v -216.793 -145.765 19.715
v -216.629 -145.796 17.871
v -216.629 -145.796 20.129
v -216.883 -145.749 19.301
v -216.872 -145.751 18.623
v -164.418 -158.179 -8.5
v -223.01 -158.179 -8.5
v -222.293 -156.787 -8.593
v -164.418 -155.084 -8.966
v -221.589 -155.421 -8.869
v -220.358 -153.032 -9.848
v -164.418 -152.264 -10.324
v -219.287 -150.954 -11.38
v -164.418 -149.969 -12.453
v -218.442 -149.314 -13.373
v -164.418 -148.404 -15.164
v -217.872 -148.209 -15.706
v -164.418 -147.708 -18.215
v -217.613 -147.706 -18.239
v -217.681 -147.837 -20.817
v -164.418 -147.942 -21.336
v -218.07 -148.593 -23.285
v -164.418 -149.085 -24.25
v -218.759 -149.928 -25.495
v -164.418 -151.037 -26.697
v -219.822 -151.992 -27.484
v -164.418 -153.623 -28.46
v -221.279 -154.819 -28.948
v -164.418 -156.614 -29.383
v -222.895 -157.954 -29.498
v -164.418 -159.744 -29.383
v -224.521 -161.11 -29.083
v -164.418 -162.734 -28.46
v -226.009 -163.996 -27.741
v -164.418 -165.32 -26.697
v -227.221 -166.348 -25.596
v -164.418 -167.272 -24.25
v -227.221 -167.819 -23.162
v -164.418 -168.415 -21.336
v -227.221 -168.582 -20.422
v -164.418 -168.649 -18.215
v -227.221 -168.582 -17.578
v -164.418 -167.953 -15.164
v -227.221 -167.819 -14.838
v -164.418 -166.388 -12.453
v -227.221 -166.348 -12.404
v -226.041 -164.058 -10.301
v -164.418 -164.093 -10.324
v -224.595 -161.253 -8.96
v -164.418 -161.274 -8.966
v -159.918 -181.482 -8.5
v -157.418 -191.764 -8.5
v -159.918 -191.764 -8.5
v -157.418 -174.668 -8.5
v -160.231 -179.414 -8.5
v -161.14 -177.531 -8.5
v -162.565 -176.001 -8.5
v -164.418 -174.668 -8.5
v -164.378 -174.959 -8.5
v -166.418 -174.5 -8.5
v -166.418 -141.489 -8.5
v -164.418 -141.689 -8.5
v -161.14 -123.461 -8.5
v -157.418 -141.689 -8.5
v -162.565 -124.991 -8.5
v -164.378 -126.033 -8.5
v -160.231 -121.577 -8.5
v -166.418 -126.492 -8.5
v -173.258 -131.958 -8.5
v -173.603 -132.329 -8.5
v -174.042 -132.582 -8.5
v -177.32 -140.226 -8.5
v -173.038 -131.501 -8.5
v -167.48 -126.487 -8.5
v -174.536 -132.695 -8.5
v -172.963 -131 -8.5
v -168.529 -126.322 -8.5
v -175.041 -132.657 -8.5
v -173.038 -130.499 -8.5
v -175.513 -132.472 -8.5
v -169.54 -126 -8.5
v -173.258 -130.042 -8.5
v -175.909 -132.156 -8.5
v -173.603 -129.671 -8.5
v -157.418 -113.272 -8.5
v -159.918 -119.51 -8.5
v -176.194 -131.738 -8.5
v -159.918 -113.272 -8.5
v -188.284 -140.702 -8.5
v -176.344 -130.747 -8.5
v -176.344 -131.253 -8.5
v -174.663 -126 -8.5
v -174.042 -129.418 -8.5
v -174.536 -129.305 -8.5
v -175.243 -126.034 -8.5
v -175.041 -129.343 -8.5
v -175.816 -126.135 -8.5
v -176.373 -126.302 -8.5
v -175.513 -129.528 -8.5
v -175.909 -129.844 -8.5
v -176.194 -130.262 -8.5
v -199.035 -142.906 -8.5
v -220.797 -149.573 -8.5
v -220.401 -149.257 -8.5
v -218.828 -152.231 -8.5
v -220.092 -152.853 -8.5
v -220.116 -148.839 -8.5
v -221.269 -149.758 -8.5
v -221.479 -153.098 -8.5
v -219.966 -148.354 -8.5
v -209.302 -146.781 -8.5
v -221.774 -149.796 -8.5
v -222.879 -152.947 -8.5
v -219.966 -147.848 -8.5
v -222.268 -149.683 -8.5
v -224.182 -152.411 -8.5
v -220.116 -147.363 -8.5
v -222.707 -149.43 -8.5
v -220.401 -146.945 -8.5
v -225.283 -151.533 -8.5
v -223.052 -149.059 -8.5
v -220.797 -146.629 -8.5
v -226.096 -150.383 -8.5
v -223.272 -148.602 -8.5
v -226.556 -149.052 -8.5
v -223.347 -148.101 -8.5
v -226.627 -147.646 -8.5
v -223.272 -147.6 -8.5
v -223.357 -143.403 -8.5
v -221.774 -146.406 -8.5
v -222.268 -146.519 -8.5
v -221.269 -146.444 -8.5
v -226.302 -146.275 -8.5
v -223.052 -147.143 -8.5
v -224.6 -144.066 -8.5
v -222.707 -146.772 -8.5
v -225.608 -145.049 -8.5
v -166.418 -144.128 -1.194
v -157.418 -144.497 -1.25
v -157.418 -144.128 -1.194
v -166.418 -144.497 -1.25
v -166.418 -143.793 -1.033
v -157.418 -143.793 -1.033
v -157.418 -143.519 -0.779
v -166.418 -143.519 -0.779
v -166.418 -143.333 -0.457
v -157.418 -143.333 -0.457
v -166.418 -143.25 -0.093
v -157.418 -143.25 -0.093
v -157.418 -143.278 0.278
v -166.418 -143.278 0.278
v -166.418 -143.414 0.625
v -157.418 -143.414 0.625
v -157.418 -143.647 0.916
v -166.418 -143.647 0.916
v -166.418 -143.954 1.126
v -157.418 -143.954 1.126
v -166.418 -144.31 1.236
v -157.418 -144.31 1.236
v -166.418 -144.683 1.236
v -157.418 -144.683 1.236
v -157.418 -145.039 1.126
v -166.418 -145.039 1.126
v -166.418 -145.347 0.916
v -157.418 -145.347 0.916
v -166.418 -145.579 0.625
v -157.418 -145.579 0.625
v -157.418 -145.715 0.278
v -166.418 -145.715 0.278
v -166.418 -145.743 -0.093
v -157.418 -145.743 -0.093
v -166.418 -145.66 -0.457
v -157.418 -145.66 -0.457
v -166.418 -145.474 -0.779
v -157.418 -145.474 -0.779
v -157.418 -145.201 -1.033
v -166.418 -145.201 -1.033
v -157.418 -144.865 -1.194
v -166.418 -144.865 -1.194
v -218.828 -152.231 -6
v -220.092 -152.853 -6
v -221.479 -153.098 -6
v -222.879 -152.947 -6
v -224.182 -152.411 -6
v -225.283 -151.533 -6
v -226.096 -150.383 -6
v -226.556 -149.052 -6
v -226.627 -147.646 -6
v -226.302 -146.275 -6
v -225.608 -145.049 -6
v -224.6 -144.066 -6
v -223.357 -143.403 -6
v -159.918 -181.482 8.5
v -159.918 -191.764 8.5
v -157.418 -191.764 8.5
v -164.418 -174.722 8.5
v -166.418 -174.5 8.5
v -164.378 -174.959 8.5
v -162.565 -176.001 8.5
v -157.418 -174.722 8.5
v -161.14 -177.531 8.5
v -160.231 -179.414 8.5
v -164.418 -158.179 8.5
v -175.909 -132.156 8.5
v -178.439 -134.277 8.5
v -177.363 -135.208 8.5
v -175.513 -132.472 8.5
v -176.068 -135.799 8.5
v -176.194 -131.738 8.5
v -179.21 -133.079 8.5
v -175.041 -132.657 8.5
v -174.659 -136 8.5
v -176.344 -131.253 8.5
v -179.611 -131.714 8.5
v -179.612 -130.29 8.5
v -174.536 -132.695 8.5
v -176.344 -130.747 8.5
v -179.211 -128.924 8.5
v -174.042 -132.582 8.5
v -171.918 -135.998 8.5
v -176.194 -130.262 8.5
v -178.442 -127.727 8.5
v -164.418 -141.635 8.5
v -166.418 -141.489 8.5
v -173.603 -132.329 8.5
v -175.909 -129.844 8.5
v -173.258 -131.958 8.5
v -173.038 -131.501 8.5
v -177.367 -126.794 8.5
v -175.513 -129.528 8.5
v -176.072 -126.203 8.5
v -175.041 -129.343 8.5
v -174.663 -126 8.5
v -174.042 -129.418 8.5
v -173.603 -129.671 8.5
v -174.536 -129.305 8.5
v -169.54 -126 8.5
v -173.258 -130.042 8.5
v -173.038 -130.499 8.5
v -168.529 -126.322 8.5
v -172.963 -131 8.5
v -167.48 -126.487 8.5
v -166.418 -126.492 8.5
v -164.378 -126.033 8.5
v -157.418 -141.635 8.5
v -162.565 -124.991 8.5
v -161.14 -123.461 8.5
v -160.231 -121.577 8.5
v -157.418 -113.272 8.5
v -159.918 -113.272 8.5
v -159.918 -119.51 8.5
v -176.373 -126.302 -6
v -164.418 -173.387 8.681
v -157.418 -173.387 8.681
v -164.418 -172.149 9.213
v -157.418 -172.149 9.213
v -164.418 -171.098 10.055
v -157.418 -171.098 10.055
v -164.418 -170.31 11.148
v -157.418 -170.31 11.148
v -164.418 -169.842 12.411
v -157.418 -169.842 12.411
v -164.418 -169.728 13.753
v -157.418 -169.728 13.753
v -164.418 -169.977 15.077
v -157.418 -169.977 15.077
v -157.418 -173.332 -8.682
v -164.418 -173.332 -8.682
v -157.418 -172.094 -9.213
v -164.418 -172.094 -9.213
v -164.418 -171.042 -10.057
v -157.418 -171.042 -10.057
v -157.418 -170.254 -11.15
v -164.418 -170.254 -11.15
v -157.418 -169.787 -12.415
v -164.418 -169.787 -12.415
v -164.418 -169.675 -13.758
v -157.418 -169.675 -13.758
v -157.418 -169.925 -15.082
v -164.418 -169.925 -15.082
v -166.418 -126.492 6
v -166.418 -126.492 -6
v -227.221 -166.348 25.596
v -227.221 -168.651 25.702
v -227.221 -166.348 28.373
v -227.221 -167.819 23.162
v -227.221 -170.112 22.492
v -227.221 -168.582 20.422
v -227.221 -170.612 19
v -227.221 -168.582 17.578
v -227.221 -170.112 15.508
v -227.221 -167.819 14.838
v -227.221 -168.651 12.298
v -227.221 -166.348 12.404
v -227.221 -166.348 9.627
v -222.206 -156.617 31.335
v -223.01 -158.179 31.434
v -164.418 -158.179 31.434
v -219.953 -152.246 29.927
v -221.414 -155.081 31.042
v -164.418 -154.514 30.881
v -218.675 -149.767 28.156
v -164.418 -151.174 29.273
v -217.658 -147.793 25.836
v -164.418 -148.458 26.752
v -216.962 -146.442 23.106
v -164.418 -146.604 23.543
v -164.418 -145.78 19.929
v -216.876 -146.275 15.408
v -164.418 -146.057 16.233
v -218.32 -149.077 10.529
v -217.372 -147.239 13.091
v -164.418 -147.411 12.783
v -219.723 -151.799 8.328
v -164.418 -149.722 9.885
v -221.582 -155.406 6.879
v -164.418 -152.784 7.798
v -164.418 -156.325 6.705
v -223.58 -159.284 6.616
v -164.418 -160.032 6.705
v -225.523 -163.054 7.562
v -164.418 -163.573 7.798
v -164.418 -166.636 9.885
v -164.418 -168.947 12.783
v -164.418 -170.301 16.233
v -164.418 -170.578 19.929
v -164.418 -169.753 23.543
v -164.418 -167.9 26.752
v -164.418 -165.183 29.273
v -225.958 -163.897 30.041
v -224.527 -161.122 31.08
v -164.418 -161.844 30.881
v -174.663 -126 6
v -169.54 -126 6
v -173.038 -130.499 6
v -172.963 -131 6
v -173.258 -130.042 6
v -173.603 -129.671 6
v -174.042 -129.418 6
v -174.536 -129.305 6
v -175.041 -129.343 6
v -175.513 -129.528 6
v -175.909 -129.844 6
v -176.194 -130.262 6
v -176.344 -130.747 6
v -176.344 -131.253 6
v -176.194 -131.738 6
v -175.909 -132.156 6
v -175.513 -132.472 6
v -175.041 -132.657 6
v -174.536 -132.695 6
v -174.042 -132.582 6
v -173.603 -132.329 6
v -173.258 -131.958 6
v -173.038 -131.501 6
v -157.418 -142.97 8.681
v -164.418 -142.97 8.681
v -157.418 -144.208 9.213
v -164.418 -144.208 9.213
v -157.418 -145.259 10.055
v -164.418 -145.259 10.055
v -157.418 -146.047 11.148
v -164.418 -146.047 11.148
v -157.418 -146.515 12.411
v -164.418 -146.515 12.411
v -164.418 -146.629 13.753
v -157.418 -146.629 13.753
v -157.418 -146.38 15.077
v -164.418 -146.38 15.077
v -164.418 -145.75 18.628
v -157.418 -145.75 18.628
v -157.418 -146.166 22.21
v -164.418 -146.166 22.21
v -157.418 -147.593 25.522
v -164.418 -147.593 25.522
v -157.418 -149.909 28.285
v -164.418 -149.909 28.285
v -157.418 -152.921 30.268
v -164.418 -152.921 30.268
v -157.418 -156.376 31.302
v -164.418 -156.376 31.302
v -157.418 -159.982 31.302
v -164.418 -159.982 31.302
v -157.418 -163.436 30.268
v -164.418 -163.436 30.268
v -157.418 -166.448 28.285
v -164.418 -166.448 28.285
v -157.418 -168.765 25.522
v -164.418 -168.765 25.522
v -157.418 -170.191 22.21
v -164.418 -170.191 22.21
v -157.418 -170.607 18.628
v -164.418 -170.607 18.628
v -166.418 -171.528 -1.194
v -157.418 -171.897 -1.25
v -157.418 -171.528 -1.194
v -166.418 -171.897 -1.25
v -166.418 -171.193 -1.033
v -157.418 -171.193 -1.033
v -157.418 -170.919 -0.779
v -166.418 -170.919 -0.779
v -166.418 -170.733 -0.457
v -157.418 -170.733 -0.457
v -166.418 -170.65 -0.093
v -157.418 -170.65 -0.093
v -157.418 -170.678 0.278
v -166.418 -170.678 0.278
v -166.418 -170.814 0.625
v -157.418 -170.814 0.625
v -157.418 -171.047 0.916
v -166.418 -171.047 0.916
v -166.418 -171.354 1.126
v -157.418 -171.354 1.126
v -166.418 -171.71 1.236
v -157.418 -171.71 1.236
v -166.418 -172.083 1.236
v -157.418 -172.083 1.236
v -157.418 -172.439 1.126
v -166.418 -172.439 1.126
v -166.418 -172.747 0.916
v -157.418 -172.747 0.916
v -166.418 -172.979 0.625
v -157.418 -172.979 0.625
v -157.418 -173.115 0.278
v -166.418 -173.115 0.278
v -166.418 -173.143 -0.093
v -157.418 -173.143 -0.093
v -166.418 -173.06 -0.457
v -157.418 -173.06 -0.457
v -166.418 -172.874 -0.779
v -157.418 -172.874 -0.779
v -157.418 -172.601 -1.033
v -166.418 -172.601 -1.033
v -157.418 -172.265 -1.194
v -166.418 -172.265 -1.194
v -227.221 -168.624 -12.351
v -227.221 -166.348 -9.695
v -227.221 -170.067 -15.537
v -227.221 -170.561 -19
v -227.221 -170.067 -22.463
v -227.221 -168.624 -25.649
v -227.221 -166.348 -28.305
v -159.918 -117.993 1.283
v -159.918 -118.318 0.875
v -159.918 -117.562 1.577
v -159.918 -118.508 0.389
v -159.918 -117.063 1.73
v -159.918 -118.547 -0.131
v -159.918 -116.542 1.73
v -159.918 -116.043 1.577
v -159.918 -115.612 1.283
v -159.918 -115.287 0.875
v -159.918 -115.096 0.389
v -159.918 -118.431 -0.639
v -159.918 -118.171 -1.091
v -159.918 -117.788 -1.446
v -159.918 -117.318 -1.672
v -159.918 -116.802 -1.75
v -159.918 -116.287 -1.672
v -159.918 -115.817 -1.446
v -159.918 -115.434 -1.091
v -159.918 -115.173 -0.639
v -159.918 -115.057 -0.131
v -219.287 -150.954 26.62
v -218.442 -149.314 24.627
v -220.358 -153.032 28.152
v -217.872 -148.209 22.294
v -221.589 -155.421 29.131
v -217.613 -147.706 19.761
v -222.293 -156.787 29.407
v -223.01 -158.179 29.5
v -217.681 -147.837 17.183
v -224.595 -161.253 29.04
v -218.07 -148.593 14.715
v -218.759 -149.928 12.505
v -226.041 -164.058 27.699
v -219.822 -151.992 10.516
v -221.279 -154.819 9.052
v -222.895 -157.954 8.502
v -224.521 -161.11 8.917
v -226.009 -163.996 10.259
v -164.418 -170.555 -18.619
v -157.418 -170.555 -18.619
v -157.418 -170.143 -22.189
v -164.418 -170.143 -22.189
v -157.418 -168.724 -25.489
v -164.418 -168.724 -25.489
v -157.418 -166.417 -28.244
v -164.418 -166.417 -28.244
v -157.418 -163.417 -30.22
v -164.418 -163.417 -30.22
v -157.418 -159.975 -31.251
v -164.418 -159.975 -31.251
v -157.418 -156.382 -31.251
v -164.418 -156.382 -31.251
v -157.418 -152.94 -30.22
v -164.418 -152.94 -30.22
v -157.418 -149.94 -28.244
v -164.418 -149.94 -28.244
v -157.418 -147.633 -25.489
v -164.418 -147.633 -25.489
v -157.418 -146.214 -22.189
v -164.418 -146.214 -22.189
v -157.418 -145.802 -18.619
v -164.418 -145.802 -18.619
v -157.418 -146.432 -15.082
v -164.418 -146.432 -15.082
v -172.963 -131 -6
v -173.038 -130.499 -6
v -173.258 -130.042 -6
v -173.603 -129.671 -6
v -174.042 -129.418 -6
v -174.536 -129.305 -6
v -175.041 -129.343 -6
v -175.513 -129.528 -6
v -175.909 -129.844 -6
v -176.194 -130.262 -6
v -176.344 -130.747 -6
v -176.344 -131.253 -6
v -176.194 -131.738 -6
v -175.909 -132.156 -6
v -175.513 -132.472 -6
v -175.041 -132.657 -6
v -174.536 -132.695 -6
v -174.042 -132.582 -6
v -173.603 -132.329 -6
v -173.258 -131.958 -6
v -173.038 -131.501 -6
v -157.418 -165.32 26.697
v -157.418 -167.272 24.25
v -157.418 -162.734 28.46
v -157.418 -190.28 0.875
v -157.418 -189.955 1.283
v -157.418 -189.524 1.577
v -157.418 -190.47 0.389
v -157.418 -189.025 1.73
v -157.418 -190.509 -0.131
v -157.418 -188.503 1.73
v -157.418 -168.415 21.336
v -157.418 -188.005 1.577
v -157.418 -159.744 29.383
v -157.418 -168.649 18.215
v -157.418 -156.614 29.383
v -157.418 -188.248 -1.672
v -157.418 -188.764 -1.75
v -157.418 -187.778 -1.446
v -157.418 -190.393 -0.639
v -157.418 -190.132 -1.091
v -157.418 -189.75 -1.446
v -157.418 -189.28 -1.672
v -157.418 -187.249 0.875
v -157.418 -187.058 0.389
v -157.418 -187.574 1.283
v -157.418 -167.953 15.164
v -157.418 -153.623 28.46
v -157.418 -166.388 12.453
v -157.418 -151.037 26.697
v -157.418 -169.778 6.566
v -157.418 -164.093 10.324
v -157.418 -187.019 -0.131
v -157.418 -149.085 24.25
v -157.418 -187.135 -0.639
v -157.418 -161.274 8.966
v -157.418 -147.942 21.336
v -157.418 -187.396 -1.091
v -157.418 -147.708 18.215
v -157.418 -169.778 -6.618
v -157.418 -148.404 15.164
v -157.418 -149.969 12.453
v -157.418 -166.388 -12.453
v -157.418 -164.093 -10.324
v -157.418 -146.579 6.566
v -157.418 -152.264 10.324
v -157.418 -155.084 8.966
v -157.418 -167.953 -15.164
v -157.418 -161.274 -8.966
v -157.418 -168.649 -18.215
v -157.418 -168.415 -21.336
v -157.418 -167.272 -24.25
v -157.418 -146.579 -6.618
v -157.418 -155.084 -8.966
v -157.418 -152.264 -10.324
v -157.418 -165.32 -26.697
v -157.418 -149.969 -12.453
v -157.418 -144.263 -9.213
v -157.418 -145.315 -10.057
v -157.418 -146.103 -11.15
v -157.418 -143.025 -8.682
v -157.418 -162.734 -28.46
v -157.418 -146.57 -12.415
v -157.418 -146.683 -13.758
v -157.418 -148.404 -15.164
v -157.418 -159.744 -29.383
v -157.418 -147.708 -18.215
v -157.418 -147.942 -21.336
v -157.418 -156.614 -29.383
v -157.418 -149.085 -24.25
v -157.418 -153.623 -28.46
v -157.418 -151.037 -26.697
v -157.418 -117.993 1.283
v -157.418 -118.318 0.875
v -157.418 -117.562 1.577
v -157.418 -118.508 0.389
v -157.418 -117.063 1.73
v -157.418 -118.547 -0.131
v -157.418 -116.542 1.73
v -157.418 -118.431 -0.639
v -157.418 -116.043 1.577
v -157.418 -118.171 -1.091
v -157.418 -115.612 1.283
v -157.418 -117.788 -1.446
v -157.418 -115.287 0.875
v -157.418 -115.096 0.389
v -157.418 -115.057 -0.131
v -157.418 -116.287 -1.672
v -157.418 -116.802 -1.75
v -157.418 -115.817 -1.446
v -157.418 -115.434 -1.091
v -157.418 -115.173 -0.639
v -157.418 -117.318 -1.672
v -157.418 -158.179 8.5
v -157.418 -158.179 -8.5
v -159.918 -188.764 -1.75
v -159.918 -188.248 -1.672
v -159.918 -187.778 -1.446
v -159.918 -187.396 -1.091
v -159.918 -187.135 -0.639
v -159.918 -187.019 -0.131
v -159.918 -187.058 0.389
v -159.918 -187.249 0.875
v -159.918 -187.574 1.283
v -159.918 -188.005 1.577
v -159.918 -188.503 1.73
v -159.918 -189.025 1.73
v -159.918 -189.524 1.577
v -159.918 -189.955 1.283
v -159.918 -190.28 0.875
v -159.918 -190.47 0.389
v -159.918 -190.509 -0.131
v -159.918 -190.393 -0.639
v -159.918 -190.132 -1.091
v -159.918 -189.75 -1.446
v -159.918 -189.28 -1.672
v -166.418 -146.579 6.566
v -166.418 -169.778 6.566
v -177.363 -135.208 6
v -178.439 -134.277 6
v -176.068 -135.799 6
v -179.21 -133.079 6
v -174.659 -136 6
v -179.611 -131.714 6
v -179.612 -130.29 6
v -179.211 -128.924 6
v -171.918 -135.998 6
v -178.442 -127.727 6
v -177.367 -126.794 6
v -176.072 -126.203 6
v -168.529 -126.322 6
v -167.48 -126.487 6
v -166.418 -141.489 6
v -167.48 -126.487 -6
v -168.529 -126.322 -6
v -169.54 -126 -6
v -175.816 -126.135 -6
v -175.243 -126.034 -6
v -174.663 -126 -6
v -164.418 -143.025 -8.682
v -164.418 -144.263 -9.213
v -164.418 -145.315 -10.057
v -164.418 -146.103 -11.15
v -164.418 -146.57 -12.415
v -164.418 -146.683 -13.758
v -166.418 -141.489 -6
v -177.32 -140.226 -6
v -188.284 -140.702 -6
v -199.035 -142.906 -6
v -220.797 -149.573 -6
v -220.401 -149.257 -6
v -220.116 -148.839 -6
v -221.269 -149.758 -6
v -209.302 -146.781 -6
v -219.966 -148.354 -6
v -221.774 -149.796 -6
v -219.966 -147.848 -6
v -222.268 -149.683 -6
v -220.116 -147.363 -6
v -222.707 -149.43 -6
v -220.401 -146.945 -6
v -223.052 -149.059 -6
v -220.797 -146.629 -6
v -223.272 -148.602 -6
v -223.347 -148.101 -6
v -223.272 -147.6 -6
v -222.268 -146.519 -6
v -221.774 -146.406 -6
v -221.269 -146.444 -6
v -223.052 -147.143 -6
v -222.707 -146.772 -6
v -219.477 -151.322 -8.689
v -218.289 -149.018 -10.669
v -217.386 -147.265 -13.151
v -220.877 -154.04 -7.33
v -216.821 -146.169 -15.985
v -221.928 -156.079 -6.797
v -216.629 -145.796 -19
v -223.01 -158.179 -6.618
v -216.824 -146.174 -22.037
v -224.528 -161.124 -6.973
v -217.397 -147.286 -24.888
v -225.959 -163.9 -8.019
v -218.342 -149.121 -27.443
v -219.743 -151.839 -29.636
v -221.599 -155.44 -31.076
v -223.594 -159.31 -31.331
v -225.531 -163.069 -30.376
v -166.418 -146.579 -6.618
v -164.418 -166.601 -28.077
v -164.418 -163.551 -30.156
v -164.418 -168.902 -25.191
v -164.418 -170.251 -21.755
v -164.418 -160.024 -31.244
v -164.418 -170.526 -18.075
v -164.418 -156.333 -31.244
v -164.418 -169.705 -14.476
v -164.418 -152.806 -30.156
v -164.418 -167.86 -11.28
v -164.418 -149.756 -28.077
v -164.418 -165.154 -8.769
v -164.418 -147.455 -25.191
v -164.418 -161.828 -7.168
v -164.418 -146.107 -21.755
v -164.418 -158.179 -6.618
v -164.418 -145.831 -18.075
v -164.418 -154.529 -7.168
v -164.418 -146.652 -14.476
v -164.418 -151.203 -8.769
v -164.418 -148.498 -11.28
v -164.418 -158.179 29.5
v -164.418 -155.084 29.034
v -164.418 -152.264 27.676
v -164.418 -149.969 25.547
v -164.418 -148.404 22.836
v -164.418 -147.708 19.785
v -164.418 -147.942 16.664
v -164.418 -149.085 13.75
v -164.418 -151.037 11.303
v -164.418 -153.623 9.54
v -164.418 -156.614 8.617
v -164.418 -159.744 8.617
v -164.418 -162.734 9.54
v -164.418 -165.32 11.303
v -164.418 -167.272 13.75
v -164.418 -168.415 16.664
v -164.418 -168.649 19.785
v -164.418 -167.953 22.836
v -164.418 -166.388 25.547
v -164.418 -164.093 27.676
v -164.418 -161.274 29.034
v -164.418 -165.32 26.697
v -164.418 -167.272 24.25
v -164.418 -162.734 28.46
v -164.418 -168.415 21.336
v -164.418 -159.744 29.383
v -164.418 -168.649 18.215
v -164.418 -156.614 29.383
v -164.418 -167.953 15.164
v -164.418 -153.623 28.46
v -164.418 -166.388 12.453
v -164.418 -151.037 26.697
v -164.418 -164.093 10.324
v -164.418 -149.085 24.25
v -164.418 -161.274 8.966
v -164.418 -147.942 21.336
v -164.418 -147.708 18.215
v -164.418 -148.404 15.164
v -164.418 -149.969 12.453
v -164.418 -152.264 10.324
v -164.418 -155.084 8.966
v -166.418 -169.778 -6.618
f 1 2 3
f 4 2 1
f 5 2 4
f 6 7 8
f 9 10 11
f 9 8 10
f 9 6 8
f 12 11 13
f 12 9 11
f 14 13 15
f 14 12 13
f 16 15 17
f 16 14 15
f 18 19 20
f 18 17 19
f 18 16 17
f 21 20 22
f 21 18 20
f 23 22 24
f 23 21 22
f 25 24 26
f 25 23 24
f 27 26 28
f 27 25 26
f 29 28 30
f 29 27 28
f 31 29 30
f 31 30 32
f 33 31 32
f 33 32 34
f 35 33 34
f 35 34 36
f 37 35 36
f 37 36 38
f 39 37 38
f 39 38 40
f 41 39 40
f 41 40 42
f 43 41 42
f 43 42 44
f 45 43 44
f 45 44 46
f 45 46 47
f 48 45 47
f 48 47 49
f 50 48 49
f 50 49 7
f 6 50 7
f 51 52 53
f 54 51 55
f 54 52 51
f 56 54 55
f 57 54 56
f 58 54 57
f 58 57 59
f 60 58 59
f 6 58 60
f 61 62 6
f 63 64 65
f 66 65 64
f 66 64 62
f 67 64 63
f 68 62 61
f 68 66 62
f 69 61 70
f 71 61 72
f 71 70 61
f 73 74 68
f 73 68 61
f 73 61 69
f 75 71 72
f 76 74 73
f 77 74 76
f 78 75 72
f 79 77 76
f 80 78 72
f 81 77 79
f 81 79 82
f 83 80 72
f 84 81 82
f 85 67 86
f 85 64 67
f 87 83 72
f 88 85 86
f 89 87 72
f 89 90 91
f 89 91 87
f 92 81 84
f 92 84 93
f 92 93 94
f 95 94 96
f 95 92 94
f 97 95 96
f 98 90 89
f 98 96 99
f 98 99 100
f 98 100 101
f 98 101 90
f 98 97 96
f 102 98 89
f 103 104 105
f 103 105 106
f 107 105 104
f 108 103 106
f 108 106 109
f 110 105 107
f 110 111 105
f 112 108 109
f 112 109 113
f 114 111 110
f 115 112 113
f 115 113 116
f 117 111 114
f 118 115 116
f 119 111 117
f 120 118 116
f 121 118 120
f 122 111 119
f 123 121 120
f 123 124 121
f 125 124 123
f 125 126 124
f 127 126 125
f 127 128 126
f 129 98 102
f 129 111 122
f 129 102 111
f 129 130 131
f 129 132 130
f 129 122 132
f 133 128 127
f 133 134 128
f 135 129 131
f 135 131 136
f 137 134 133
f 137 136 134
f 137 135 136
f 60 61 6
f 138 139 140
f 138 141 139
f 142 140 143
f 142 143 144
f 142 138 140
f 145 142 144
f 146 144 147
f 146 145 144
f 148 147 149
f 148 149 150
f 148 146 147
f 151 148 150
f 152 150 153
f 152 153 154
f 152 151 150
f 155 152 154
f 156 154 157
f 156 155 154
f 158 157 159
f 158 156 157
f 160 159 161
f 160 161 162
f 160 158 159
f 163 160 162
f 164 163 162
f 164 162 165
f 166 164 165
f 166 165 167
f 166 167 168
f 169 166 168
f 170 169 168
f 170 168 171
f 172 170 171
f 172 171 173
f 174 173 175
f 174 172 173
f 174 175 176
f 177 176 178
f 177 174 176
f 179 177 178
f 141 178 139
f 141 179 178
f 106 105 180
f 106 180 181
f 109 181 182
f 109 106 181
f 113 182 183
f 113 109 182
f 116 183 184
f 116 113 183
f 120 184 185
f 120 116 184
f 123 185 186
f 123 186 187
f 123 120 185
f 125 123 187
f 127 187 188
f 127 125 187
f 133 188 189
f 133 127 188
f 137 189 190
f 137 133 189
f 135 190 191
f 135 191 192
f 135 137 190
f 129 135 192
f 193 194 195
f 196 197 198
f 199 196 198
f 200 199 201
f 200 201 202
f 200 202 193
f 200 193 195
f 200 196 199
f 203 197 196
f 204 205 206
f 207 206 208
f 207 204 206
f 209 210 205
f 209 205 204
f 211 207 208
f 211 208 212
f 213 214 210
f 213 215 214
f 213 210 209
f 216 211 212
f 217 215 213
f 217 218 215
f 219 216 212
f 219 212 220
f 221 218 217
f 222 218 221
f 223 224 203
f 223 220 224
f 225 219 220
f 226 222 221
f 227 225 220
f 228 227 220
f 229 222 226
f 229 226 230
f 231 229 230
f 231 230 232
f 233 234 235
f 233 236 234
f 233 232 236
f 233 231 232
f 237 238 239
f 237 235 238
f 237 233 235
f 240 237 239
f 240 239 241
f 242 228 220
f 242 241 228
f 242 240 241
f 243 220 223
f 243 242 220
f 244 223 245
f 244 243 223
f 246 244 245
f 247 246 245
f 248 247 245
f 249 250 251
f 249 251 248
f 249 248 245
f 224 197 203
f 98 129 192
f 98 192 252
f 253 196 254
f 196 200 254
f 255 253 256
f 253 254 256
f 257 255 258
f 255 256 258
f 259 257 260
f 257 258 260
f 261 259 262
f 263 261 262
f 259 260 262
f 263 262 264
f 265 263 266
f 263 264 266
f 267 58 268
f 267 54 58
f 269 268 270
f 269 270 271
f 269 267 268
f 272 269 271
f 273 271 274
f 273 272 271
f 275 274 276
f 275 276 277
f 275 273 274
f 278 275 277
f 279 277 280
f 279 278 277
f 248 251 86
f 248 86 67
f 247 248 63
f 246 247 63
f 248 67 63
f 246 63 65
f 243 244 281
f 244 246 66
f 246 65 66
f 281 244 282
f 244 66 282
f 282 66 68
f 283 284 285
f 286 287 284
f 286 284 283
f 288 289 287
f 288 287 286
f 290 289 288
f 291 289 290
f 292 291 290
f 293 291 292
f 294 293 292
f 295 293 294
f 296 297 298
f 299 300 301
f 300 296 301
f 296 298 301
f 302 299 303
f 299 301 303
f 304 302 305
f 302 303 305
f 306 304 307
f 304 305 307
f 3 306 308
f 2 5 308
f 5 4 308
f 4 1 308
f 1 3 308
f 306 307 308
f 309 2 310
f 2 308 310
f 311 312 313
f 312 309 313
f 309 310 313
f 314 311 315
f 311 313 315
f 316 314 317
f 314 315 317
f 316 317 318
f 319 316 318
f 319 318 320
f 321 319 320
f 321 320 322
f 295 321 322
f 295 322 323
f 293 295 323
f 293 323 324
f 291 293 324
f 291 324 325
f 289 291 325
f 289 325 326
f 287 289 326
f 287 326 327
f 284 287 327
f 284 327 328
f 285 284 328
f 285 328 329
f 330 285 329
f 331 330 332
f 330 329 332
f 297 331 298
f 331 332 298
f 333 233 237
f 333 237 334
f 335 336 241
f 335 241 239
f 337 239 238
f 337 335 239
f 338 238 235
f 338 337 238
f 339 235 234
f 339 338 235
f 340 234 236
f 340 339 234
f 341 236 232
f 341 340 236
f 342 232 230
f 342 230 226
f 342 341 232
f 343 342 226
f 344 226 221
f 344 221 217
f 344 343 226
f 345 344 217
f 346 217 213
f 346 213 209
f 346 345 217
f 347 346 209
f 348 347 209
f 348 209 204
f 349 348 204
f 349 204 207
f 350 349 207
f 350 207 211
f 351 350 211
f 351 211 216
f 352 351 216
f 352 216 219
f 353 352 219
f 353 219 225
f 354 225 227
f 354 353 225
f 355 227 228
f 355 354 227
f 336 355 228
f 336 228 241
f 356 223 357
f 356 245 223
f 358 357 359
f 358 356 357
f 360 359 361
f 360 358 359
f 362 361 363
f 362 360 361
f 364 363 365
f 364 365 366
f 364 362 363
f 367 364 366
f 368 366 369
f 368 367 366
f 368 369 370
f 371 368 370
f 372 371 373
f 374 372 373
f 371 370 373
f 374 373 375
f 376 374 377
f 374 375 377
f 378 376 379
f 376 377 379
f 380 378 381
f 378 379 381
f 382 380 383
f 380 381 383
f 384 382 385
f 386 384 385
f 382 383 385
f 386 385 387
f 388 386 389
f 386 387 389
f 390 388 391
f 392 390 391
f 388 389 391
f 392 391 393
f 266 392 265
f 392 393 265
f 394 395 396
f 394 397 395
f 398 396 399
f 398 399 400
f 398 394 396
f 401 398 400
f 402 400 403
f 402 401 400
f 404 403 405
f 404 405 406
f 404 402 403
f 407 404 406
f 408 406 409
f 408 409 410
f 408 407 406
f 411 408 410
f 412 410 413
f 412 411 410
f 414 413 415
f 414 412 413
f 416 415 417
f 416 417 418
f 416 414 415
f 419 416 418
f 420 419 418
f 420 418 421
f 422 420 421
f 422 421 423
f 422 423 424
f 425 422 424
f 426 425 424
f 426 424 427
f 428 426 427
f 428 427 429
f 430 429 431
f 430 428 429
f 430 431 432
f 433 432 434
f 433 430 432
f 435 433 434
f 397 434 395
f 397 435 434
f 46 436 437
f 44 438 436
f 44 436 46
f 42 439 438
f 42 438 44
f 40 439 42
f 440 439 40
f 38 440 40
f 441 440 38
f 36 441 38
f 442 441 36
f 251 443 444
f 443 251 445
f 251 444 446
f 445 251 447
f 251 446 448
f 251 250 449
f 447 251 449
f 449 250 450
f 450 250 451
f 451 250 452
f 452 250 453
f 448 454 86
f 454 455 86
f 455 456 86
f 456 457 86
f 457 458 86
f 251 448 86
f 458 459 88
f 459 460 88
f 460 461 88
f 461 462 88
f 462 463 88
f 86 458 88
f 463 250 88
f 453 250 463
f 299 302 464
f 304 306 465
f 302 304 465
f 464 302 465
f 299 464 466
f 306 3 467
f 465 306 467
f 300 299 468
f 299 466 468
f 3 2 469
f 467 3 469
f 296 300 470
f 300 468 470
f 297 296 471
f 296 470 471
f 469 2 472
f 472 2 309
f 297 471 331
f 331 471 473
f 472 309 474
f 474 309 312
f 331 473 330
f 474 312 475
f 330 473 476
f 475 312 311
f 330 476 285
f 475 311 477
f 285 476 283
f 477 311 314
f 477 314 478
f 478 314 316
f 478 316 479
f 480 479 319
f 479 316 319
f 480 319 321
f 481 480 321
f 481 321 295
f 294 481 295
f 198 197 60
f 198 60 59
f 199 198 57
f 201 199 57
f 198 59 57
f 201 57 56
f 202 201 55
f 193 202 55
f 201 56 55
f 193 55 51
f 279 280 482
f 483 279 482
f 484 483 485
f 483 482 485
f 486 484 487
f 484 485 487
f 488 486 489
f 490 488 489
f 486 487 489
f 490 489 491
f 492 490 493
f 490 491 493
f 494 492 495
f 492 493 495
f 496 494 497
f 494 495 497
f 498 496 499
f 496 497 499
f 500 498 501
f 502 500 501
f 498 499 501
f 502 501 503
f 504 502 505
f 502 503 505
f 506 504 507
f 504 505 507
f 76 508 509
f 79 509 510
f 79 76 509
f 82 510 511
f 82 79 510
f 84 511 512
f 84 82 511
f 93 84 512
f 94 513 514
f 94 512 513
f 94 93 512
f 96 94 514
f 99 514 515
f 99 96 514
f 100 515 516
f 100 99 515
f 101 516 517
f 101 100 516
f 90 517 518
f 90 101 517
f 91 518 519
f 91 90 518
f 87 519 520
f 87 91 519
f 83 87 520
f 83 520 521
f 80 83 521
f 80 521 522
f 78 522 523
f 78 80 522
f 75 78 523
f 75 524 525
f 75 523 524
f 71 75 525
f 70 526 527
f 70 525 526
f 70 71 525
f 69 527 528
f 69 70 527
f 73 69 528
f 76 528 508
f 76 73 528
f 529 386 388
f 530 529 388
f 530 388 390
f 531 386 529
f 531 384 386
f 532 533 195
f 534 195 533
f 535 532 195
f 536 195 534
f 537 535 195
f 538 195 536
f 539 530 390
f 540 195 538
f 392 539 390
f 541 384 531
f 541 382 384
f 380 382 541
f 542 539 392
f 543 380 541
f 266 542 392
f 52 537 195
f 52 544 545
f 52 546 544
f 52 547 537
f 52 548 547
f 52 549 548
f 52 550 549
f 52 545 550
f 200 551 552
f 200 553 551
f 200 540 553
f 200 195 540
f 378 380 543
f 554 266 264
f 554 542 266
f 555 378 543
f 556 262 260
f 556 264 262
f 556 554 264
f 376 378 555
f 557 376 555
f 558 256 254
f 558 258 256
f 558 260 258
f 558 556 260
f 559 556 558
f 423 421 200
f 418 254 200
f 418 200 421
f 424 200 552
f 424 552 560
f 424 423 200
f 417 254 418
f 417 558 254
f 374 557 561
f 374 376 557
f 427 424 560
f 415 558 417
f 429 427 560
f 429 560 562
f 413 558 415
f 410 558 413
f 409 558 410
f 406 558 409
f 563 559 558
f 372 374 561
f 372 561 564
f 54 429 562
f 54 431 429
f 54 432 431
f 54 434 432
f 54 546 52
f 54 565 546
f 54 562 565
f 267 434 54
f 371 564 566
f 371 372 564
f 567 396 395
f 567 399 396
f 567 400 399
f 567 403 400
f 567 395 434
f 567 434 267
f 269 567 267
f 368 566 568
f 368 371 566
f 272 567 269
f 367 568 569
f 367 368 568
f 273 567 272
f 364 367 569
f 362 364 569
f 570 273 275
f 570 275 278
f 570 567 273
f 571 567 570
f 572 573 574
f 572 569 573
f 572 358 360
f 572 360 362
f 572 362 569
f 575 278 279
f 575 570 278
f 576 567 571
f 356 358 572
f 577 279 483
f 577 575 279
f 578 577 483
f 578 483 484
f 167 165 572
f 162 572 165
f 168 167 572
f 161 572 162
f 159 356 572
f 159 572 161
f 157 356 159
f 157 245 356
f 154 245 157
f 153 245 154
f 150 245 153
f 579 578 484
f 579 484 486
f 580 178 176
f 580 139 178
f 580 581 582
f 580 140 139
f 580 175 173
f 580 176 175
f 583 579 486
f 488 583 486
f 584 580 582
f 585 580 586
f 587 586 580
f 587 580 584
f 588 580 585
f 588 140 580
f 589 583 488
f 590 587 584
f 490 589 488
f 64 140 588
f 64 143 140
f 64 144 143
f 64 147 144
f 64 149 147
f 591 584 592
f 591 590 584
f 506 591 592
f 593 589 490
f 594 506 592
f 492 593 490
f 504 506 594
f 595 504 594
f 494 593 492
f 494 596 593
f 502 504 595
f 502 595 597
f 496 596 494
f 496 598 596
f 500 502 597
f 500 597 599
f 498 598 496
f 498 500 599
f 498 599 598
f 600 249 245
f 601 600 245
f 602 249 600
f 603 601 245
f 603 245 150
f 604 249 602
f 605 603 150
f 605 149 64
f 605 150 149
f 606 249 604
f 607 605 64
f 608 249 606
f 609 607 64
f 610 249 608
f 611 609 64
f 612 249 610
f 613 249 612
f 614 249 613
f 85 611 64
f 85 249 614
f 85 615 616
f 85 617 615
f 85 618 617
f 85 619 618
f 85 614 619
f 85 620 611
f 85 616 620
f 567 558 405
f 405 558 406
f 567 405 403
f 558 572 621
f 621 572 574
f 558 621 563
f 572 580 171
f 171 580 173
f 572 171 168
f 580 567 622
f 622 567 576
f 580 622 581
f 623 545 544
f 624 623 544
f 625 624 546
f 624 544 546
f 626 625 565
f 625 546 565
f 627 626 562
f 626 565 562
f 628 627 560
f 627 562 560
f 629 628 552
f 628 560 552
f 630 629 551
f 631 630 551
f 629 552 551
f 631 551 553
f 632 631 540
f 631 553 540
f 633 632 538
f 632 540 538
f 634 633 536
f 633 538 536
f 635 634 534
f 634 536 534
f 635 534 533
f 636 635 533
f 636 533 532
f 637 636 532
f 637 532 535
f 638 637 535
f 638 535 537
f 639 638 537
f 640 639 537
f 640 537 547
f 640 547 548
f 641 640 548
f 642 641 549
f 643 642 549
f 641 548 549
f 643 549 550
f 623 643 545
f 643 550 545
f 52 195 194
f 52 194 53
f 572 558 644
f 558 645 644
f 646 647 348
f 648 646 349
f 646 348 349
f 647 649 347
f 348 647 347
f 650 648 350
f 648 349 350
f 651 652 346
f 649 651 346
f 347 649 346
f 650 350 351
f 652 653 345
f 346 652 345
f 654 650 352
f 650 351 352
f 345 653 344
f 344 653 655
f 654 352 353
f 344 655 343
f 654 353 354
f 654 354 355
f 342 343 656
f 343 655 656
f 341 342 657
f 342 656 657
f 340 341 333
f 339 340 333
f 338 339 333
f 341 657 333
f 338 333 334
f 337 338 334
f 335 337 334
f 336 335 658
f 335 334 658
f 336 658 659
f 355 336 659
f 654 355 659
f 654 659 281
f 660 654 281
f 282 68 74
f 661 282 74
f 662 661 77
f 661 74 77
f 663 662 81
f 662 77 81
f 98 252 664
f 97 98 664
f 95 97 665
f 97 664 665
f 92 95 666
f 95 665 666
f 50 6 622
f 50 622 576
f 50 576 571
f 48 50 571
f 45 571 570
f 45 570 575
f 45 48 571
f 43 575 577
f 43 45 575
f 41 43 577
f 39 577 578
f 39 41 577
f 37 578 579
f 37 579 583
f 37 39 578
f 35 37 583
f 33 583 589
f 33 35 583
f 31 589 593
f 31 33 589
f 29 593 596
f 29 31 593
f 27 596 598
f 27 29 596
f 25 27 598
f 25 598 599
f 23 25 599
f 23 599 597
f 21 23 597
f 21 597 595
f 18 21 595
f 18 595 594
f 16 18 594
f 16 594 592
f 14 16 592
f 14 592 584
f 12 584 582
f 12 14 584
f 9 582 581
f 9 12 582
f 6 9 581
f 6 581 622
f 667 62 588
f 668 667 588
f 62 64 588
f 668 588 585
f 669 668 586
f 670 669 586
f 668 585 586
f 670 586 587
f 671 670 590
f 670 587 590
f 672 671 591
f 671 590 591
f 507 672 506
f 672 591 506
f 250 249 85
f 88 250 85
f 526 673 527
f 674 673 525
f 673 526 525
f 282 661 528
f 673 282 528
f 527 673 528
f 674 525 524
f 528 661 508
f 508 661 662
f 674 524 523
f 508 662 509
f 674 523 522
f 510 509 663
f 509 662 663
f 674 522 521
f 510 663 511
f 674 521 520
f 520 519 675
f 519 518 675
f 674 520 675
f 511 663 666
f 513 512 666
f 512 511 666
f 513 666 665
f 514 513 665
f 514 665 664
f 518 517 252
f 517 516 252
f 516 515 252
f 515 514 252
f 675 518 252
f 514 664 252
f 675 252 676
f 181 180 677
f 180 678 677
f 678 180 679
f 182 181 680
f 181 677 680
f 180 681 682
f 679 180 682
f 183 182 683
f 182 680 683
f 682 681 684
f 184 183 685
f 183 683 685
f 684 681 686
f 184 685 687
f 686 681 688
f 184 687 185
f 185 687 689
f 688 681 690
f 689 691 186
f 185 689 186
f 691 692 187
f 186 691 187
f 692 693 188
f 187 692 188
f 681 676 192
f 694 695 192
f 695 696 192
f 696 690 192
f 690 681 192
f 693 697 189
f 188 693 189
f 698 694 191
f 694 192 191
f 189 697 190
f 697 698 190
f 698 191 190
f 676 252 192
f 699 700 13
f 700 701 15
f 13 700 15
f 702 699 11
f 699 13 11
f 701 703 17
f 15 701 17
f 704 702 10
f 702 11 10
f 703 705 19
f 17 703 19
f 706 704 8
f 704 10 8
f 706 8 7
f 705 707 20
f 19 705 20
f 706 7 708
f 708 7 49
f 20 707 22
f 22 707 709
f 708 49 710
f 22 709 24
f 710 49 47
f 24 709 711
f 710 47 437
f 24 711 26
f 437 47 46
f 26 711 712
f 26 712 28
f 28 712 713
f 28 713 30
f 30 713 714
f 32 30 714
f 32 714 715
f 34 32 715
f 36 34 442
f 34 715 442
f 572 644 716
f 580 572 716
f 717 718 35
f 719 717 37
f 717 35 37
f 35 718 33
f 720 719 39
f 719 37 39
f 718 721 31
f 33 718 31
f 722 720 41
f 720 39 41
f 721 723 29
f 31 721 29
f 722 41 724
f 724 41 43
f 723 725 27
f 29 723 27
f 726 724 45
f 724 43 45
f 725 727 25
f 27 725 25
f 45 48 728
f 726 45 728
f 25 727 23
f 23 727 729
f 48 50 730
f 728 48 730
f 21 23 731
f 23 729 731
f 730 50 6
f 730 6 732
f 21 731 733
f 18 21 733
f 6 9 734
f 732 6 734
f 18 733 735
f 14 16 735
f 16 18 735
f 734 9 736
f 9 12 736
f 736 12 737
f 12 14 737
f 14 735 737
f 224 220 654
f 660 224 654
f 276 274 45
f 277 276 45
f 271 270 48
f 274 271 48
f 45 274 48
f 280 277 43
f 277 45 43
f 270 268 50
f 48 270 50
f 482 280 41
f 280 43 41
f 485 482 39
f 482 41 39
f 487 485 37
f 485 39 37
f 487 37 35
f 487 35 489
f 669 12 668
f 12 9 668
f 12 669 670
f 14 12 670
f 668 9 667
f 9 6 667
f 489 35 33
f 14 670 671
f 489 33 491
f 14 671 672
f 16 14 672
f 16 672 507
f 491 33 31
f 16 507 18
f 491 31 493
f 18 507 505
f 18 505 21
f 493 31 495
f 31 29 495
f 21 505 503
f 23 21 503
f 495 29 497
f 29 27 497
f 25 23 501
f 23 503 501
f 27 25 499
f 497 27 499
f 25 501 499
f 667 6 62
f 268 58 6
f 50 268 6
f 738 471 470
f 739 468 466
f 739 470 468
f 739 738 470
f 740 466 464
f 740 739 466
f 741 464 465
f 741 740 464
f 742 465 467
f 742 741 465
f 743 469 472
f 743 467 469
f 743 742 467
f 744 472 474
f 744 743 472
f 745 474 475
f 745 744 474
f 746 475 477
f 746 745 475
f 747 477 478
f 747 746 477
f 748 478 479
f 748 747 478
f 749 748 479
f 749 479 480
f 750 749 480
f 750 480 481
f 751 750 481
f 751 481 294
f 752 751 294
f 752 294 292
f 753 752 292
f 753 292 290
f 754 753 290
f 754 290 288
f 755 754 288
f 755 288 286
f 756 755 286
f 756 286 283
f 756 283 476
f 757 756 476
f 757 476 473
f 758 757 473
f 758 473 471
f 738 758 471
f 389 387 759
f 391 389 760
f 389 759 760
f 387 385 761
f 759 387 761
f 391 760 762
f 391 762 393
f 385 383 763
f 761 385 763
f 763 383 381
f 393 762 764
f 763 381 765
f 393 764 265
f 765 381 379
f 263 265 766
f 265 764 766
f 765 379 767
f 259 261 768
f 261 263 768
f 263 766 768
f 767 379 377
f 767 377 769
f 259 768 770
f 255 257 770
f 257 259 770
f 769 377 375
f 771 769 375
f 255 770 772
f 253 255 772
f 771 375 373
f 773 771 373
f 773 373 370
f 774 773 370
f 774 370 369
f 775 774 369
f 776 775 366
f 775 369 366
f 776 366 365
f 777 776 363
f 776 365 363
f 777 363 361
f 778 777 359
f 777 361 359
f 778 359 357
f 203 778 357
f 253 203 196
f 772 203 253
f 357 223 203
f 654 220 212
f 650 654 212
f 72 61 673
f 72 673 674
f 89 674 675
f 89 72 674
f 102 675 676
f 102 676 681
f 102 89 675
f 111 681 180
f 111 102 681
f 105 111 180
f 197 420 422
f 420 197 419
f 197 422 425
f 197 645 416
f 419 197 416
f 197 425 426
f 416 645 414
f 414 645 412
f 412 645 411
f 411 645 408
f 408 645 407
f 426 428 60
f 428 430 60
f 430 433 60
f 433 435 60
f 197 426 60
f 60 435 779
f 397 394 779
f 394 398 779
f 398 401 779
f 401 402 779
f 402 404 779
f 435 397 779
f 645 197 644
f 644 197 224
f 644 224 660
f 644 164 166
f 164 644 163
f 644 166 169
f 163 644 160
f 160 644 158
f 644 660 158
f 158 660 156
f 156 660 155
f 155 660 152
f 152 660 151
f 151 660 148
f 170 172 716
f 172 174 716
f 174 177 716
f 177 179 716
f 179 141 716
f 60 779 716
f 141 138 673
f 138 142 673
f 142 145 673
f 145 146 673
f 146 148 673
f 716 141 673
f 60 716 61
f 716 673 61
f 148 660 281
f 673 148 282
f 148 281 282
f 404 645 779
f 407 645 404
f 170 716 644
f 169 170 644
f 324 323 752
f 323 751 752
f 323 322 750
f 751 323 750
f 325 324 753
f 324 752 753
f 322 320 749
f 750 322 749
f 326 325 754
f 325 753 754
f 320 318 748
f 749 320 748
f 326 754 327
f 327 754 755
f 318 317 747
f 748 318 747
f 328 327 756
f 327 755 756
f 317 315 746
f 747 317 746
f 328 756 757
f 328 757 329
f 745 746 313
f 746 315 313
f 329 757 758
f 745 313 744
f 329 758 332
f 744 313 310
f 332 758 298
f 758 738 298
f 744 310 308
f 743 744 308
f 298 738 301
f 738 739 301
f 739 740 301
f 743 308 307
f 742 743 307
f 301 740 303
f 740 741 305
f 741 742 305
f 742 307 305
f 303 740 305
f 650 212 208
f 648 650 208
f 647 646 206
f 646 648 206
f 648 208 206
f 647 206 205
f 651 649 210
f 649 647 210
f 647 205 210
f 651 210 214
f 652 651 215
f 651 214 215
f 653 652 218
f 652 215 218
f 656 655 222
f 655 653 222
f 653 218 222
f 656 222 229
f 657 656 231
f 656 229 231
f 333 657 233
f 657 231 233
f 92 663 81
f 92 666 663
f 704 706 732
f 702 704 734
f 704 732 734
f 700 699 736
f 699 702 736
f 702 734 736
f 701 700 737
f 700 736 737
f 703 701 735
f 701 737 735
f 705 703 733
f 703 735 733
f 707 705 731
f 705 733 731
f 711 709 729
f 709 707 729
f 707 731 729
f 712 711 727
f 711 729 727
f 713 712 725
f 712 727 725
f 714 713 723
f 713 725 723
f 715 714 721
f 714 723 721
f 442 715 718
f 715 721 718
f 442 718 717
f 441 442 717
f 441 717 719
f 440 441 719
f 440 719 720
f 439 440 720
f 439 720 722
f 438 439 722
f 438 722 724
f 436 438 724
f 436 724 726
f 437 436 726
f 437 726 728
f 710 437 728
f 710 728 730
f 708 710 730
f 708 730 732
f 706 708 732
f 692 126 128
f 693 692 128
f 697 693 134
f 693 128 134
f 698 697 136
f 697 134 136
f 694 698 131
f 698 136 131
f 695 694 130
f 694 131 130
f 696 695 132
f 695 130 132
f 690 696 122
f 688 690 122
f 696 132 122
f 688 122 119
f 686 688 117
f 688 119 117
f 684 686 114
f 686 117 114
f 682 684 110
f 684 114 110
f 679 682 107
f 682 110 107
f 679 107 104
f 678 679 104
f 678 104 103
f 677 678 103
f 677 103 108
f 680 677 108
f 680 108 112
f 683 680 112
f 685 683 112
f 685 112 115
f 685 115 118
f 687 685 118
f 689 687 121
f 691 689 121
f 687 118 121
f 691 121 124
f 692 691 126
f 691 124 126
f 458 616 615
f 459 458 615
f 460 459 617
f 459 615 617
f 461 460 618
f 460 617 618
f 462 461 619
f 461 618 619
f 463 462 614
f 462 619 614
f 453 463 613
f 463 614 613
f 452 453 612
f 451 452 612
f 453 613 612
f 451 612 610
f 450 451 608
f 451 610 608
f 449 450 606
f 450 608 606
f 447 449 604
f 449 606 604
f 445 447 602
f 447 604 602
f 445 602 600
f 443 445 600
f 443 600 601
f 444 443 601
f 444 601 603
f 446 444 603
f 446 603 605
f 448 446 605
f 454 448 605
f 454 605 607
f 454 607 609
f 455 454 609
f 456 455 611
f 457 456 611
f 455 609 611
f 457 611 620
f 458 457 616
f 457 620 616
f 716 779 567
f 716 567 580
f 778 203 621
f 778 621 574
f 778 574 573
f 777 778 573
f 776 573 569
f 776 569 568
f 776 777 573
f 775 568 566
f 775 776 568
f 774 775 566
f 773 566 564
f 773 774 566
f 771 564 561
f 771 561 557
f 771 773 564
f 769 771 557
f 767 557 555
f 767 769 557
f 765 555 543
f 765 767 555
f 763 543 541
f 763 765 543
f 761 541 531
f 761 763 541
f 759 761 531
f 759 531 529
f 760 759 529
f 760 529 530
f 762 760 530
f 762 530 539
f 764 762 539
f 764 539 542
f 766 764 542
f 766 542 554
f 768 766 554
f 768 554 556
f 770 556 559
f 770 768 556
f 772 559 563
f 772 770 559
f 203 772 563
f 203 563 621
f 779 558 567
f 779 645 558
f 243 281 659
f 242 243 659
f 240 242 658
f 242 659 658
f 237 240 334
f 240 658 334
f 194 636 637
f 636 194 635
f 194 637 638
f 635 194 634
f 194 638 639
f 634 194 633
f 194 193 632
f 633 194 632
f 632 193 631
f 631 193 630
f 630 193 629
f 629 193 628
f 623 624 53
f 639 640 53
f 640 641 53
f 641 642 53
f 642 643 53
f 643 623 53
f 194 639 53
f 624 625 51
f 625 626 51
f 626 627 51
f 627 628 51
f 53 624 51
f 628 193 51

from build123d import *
from OCP.BRepFilletAPI import BRepFilletAPI_MakeChamfer

# Parameters (mm, degrees)
SKETCH_1_R          = 1.7
EXTRUDE_1_DEPTH     = 8.5
SKETCH_2_W          = 12
SKETCH_2_H          = 22.490317402
CUT_EXTRUDE_1_DEPTH = 17
SKETCH_3_W          = 17
SKETCH_3_H          = 48.5
SKETCH_3_R          = 1.25
SKETCH_3_W_2        = 13.183847054
SKETCH_3_H_2        = 23.198500104
EXTRUDE_2_DEPTH     = 2
CUT_EXTRUDE_2_DEPTH = 27
CHAMFER_1_SIZE      = 5.5
CHAMFER_1_SIZE2     = 5.4954286
SKETCH_5_R          = 10.5
SKETCH_5_R_2        = 1.25
SKETCH_5_W          = 13.183847054
SKETCH_5_H          = 23.198500104
EXTRUDE_3_DEPTH     = 7
SKETCH_6_R          = 12.433743537
SKETCH_6_R_2        = 10.5
EXTRUDE_4_DEPTH     = 65
SKETCH_6_R_3        = 12.382409409
EXTRUDE_4_2_DEPTH   = 65
CUT_EXTRUDE_3_DEPTH = 50
SKETCH_8_W          = 17
SKETCH_8_H          = 17.264216674
SKETCH_8_R          = 1.75
SKETCH_8_H_2        = 24.850413137
EXTRUDE_5_DEPTH     = 2.5
FILLET_START        = -8.5
FILLET_1_DEPTH      = 17
FILLET_1_2_DEPTH    = 2.5
FILLET_START_2      = 6
FILLET_1_3_DEPTH    = 2.5
FILLET_2_R          = 5
SKETCH_9_R          = 1.7
EXTRUDE_6_DEPTH     = 2.5
CUT_EXTRUDE_6_DEPTH = 49
SKETCH_13_W         = 3.687301031
SKETCH_13_H         = 25.158467393
CUT_EXTRUDE_7_DEPTH = 49


with BuildPart() as part:
    # 草图1 → 凸台-拉伸1 (new, symmetric)
    with BuildSketch(Plane.XY):
        with BuildLine():
            Line((-174.662698808, -126), (-166.418250776, -126))
            Line((-166.418250776, -126), (-166.418250776, -135.993140688))
            Line((-166.418250776, -135.993140688), (-174.658537801, -135.999998269))
            ThreePointArc((-174.658537801, -135.999998269), (-179.662698375, -131.002080504), (-174.662698808, -126))
        make_face()
        with Locations((-174.662698808, -131)):
            Circle(SKETCH_1_R, mode=Mode.SUBTRACT)
    extrude(amount=EXTRUDE_1_DEPTH, both=True)

    # 草图2 → 切除-拉伸1 (cut)
    with BuildSketch(Plane(origin=(-166.418250776, 0, 0), x_dir=(0, 0, -1), z_dir=(1, 0, 0))):
        with Locations((0, -126)):
            Rectangle(SKETCH_2_W, SKETCH_2_H)
    extrude(amount=-CUT_EXTRUDE_1_DEPTH, mode=Mode.SUBTRACT)


with BuildPart() as cut_extrude_1_piece_1:
    # of the separate pieces the step leaves, piece 1, a body of its own (cut_extrude_1_pieces)
    add(part.part.solids().sort_by_distance((-174.662698808, -126, 6))[0])



with BuildPart() as cut_extrude_1_piece_2:
    # of the separate pieces the step leaves, piece 2, a body of its own (cut_extrude_1_pieces)
    add(part.part.solids().sort_by_distance((-174.662698808, -126, -8.5))[0])


with BuildPart() as cut_extrude_1_piece_1_1:
    add(cut_extrude_1_piece_1.part)

    add(cut_extrude_1_piece_2.part)  # 凸台-拉伸2 merges 切除-拉伸1 piece 2
    # 草图3 → 凸台-拉伸2 (add)
    with BuildSketch(Plane(origin=(-166.418250776, 0, 0), x_dir=(0, 0, -1), z_dir=(1, 0, 0))):
        with Locations((0, -150.25)):
            Rectangle(SKETCH_3_W, SKETCH_3_H)
        with Locations((0, -144.496752449)):
            Circle(SKETCH_3_R, mode=Mode.SUBTRACT)
        with Locations((0, -171.896752449)):
            Circle(SKETCH_3_R, mode=Mode.SUBTRACT)
        with Locations((0.025667064, -158.178609239)):
            Rectangle(SKETCH_3_W_2, SKETCH_3_H_2, mode=Mode.SUBTRACT)
    extrude(amount=EXTRUDE_2_DEPTH)

    # 草图4 → 切除-拉伸2 (cut)
    with BuildSketch(Plane(origin=(0, 0, -8.5), x_dir=(-1, 0, 0), z_dir=(0, 0, -1))):
        Polygon((169.540474792, -126), (164.418250776, -131.122224016), (164.418250776, -126), align=None)
    extrude(amount=-CUT_EXTRUDE_2_DEPTH, mode=Mode.SUBTRACT)

    # 倒角1: one chamfer whose edges measure the first distance from different faces: ONE call of the kernel's chamfer builder (chamfer() names one face for all edges)
    chamfer_1_edges_1 = [cut_extrude_1_piece_1_1.edges().sort_by_distance(p)[0] for p in [
        (-166.418250776, -135.993140688, -7.25),
    ]]
    chamfer_1_side_1 = [cut_extrude_1_piece_1_1.faces().sort_by_distance(p)[0] for p in [
        (-170.538394288, -135.996569478, -7.25),
    ]]
    chamfer_1_edges_2 = [cut_extrude_1_piece_1_1.edges().sort_by_distance(p)[0] for p in [
        (-166.418250776, -135.993140688, 7.25),
    ]]
    chamfer_1_side_2 = [cut_extrude_1_piece_1_1.faces().sort_by_distance(p)[0] for p in [
        (-170.538394288, -135.996569478, 7.25),
    ]]
    chamfer_1 = BRepFilletAPI_MakeChamfer(cut_extrude_1_piece_1_1.part.solid().wrapped)
    for e in chamfer_1_edges_1:
        chamfer_1.Add(CHAMFER_1_SIZE, CHAMFER_1_SIZE2, e.wrapped, chamfer_1_side_1[0].wrapped)  # the first distance lies on this face
    for e in chamfer_1_edges_2:
        chamfer_1.Add(CHAMFER_1_SIZE, CHAMFER_1_SIZE2, e.wrapped, chamfer_1_side_2[0].wrapped)  # the first distance lies on this face
    add(Compound.cast(chamfer_1.Shape()), mode=Mode.REPLACE)

    # 草图5 → 凸台-拉伸3 (add)
    with BuildSketch(Plane(origin=(-164.418250776, 0, 0), x_dir=(0, 0, -1), z_dir=(1, 0, 0))):
        with BuildLine():
            Line((-8.5, -164.838037019), (-8.5, -174.5))
            Line((-8.5, -174.5), (8.5, -174.5))
            Line((8.5, -174.5), (8.5, -164.741692568))
            ThreePointArc((8.5, -164.741692568), (31.382409409, -158.178609239), (8.5, -151.61552591))
            Line((8.5, -151.61552591), (8.5, -131.122224016))
            Line((8.5, -131.122224016), (-8.5, -131.122224016))
            Line((-8.5, -131.122224016), (-8.5, -151.519181459))
            ThreePointArc((-8.5, -151.519181459), (-31.433743537, -158.178609239), (-8.5, -164.838037019))
        make_face()
        with Locations((-19, -158.178609239)):
            Circle(SKETCH_5_R, mode=Mode.SUBTRACT)
        with Locations(Location((19, -158.178609239, 0), (0, 0, 180))):
            Circle(SKETCH_5_R, mode=Mode.SUBTRACT)
        with Locations((0, -171.896752449)):
            Circle(SKETCH_5_R_2, mode=Mode.SUBTRACT)
        with Locations((0, -144.496752449)):
            Circle(SKETCH_5_R_2, mode=Mode.SUBTRACT)
        with Locations((0.025667064, -158.178609239)):
            Rectangle(SKETCH_5_W, SKETCH_5_H, mode=Mode.SUBTRACT)
    extrude(amount=EXTRUDE_3_DEPTH)

    # 草图7 → 切除-拉伸3 (cut)
    with BuildSketch(Plane(origin=(0, 0, -8.5), x_dir=(-1, 0, 0), z_dir=(0, 0, -1))):
        Polygon((164.418250776, -131.122224016), (157.418250776, -138.122224016), (157.418250776, -131.122224016), align=None)
    extrude(amount=-CUT_EXTRUDE_3_DEPTH, mode=Mode.SUBTRACT)

    # 草图8 → 凸台-拉伸5 (add)
    # profile 1 of 2: a face of its own
    with BuildSketch(Plane(origin=(-157.418250776, 0, 0), x_dir=(0, 0, -1), z_dir=(1, 0, 0))):
        with Locations((0, -183.132108337)):
            Rectangle(SKETCH_8_W, SKETCH_8_H)
        with Locations((0, -188.764216674)):
            Circle(SKETCH_8_R, mode=Mode.SUBTRACT)
    # profile 2 of 2: a face of its own
    with BuildSketch(Plane(origin=(-157.418250776, 0, 0), x_dir=(0, 0, -1), z_dir=(1, 0, 0))):
        with Locations((0, -125.697017448)):
            Rectangle(SKETCH_8_W, SKETCH_8_H_2)
        with Locations((0, -116.802352716)):
            Circle(SKETCH_8_R, mode=Mode.SUBTRACT)
    extrude(amount=-EXTRUDE_5_DEPTH)

    # 圆角1: read off the stored shape, not the designer's step
    # 圆角1 outline → 圆角1 (add)
    with BuildSketch(Plane.XY.offset(FILLET_START)):
        with BuildLine():
            Line((-159.918250776, -174.5), (-166.418250776, -174.5))
            ThreePointArc((-166.418250776, -174.5), (-161.794775393, -176.712424015), (-159.918250776, -181.482120022))
            Line((-159.918250776, -181.482120022), (-159.918250776, -174.5))
        make_face()
        with BuildLine():
            Line((-166.418250776, -126.491824096), (-166.418250776, -129.122224016))
            Line((-166.418250776, -129.122224016), (-159.918250776, -135.622224016))
            Line((-159.918250776, -135.622224016), (-159.918250776, -119.509704074))
            ThreePointArc((-159.918250776, -119.509704074), (-161.794775393, -124.279400081), (-166.418250776, -126.491824096))
        make_face()
    extrude(amount=FILLET_1_DEPTH)

    # Fillet 1 2 outline → Fillet 1 2 (add)
    with BuildSketch(Plane.XY.offset(FILLET_START)):
        with BuildLine():
            Line((-169.540474792, -126), (-166.418250776, -129.122224016))
            Line((-166.418250776, -129.122224016), (-166.418250776, -126.491824096))
            ThreePointArc((-166.418250776, -126.491824096), (-168.007485107, -126.424439685), (-169.540474792, -126))
        make_face()
    extrude(amount=FILLET_1_2_DEPTH)

    # Fillet 1 3 outline → Fillet 1 3 (add)
    with BuildSketch(Plane.XY.offset(FILLET_START_2)):
        with BuildLine():
            Line((-169.540474792, -126), (-166.418250776, -129.122224016))
            Line((-166.418250776, -129.122224016), (-166.418250776, -126.491824096))
            ThreePointArc((-166.418250776, -126.491824096), (-168.007485107, -126.424439685), (-169.540474792, -126))
        make_face()
    extrude(amount=FILLET_1_3_DEPTH)

    # 圆角2
    fillet_2_edges = [cut_extrude_1_piece_1_1.edges().sort_by_distance(p)[0] for p in [
        (-160.918250776, -164.838037019, 8.5),
        (-160.918250776, -151.519181459, 8.5),
        (-160.918250776, -151.61552591, -8.5),
        (-160.918250776, -164.741692568, -8.5),
    ]]
    fillet(fillet_2_edges, radius=FILLET_2_R)

    # 草图9 → 凸台-拉伸6 (add)
    with BuildSketch(Plane(origin=(0, 0, -8.5), x_dir=(-1, 0, 0), z_dir=(0, 0, -1))):
        with BuildLine():
            Line((223.357430564, -143.402544062), (176.372799524, -126.301536896))
            ThreePointArc((176.372799524, -126.301536896), (179.586375871, -131.870289709), (174.658537801, -135.999998269))
            Line((174.658537801, -135.999998269), (171.918248871, -135.997717796))
            Line((171.918248871, -135.997717796), (166.418250776, -141.488569288))
            ThreePointArc((166.418250776, -141.488569288), (193.703161063, -141.590737418), (218.828279725, -152.230529706))
            ThreePointArc((218.828279725, -152.230529706), (226.096012217, -150.383379873), (223.357430564, -143.402544062))
        make_face()
        with Locations((221.647329847, -148.101007166)):
            Circle(SKETCH_9_R, mode=Mode.SUBTRACT)
    extrude(amount=-EXTRUDE_6_DEPTH)


with BuildPart() as body_2:
    # 草图6 → 凸台-拉伸4 (new body)
    with BuildSketch(Plane.ZY.offset(164.418250776)):
        with Locations((19, -158.178609239)):
            Circle(SKETCH_6_R)
        with Locations((19, -158.178609239)):
            Circle(SKETCH_6_R_2, mode=Mode.SUBTRACT)
    extrude(amount=EXTRUDE_4_DEPTH)


with BuildPart() as body_3:
    # 草图6 → Extrude 4 2 (new body)
    with BuildSketch(Plane.ZY.offset(164.418250776)):
        with Locations((-19, -158.178609239)):
            Circle(SKETCH_6_R_3)
        with Locations((-19, -158.178609239)):
            Circle(SKETCH_6_R_2, mode=Mode.SUBTRACT)
    extrude(amount=EXTRUDE_4_2_DEPTH)


with BuildPart() as cut_extrude_6_tool:
    # 草图12 → 切除-拉伸6 (new, symmetric)
    with BuildSketch(Plane(origin=(0, 0, -8.5), x_dir=(-1, 0, 0), z_dir=(0, 0, -1))):
        Polygon((216.629032078, -145.79619983), (229.418250776, -170.612352776), (229.418250776, -143.397590388), align=None)
    extrude(amount=CUT_EXTRUDE_6_DEPTH, both=True)


with BuildPart() as body_3_1:
    add(body_3.part)

    # 切除-拉伸6: cut by cut_extrude_6_tool
    add(cut_extrude_6_tool.part, mode=Mode.SUBTRACT)


with BuildPart() as body_2_1:
    add(body_2.part)

    # 切除-拉伸6: cut by cut_extrude_6_tool
    add(cut_extrude_6_tool.part, mode=Mode.SUBTRACT)


with BuildPart() as cut_extrude_7_tool:
    # 草图13 → 切除-拉伸7 (new, symmetric)
    with BuildSketch(Plane(origin=(0, 0, -8.5), x_dir=(-1, 0, 0), z_dir=(0, 0, -1))):
        with Locations((229.064220935, -160.680240862)):
            Rectangle(SKETCH_13_W, SKETCH_13_H)
    extrude(amount=CUT_EXTRUDE_7_DEPTH, both=True)


with BuildPart() as body_2_2:
    add(body_2_1.part)

    # 切除-拉伸7: cut by cut_extrude_7_tool
    add(cut_extrude_7_tool.part, mode=Mode.SUBTRACT)


with BuildPart() as body_3_2:
    add(body_3_1.part)

    # 切除-拉伸7: cut by cut_extrude_7_tool
    add(cut_extrude_7_tool.part, mode=Mode.SUBTRACT)


solid = Compound([cut_extrude_1_piece_1_1.part, body_2_2.part, body_3_2.part])
